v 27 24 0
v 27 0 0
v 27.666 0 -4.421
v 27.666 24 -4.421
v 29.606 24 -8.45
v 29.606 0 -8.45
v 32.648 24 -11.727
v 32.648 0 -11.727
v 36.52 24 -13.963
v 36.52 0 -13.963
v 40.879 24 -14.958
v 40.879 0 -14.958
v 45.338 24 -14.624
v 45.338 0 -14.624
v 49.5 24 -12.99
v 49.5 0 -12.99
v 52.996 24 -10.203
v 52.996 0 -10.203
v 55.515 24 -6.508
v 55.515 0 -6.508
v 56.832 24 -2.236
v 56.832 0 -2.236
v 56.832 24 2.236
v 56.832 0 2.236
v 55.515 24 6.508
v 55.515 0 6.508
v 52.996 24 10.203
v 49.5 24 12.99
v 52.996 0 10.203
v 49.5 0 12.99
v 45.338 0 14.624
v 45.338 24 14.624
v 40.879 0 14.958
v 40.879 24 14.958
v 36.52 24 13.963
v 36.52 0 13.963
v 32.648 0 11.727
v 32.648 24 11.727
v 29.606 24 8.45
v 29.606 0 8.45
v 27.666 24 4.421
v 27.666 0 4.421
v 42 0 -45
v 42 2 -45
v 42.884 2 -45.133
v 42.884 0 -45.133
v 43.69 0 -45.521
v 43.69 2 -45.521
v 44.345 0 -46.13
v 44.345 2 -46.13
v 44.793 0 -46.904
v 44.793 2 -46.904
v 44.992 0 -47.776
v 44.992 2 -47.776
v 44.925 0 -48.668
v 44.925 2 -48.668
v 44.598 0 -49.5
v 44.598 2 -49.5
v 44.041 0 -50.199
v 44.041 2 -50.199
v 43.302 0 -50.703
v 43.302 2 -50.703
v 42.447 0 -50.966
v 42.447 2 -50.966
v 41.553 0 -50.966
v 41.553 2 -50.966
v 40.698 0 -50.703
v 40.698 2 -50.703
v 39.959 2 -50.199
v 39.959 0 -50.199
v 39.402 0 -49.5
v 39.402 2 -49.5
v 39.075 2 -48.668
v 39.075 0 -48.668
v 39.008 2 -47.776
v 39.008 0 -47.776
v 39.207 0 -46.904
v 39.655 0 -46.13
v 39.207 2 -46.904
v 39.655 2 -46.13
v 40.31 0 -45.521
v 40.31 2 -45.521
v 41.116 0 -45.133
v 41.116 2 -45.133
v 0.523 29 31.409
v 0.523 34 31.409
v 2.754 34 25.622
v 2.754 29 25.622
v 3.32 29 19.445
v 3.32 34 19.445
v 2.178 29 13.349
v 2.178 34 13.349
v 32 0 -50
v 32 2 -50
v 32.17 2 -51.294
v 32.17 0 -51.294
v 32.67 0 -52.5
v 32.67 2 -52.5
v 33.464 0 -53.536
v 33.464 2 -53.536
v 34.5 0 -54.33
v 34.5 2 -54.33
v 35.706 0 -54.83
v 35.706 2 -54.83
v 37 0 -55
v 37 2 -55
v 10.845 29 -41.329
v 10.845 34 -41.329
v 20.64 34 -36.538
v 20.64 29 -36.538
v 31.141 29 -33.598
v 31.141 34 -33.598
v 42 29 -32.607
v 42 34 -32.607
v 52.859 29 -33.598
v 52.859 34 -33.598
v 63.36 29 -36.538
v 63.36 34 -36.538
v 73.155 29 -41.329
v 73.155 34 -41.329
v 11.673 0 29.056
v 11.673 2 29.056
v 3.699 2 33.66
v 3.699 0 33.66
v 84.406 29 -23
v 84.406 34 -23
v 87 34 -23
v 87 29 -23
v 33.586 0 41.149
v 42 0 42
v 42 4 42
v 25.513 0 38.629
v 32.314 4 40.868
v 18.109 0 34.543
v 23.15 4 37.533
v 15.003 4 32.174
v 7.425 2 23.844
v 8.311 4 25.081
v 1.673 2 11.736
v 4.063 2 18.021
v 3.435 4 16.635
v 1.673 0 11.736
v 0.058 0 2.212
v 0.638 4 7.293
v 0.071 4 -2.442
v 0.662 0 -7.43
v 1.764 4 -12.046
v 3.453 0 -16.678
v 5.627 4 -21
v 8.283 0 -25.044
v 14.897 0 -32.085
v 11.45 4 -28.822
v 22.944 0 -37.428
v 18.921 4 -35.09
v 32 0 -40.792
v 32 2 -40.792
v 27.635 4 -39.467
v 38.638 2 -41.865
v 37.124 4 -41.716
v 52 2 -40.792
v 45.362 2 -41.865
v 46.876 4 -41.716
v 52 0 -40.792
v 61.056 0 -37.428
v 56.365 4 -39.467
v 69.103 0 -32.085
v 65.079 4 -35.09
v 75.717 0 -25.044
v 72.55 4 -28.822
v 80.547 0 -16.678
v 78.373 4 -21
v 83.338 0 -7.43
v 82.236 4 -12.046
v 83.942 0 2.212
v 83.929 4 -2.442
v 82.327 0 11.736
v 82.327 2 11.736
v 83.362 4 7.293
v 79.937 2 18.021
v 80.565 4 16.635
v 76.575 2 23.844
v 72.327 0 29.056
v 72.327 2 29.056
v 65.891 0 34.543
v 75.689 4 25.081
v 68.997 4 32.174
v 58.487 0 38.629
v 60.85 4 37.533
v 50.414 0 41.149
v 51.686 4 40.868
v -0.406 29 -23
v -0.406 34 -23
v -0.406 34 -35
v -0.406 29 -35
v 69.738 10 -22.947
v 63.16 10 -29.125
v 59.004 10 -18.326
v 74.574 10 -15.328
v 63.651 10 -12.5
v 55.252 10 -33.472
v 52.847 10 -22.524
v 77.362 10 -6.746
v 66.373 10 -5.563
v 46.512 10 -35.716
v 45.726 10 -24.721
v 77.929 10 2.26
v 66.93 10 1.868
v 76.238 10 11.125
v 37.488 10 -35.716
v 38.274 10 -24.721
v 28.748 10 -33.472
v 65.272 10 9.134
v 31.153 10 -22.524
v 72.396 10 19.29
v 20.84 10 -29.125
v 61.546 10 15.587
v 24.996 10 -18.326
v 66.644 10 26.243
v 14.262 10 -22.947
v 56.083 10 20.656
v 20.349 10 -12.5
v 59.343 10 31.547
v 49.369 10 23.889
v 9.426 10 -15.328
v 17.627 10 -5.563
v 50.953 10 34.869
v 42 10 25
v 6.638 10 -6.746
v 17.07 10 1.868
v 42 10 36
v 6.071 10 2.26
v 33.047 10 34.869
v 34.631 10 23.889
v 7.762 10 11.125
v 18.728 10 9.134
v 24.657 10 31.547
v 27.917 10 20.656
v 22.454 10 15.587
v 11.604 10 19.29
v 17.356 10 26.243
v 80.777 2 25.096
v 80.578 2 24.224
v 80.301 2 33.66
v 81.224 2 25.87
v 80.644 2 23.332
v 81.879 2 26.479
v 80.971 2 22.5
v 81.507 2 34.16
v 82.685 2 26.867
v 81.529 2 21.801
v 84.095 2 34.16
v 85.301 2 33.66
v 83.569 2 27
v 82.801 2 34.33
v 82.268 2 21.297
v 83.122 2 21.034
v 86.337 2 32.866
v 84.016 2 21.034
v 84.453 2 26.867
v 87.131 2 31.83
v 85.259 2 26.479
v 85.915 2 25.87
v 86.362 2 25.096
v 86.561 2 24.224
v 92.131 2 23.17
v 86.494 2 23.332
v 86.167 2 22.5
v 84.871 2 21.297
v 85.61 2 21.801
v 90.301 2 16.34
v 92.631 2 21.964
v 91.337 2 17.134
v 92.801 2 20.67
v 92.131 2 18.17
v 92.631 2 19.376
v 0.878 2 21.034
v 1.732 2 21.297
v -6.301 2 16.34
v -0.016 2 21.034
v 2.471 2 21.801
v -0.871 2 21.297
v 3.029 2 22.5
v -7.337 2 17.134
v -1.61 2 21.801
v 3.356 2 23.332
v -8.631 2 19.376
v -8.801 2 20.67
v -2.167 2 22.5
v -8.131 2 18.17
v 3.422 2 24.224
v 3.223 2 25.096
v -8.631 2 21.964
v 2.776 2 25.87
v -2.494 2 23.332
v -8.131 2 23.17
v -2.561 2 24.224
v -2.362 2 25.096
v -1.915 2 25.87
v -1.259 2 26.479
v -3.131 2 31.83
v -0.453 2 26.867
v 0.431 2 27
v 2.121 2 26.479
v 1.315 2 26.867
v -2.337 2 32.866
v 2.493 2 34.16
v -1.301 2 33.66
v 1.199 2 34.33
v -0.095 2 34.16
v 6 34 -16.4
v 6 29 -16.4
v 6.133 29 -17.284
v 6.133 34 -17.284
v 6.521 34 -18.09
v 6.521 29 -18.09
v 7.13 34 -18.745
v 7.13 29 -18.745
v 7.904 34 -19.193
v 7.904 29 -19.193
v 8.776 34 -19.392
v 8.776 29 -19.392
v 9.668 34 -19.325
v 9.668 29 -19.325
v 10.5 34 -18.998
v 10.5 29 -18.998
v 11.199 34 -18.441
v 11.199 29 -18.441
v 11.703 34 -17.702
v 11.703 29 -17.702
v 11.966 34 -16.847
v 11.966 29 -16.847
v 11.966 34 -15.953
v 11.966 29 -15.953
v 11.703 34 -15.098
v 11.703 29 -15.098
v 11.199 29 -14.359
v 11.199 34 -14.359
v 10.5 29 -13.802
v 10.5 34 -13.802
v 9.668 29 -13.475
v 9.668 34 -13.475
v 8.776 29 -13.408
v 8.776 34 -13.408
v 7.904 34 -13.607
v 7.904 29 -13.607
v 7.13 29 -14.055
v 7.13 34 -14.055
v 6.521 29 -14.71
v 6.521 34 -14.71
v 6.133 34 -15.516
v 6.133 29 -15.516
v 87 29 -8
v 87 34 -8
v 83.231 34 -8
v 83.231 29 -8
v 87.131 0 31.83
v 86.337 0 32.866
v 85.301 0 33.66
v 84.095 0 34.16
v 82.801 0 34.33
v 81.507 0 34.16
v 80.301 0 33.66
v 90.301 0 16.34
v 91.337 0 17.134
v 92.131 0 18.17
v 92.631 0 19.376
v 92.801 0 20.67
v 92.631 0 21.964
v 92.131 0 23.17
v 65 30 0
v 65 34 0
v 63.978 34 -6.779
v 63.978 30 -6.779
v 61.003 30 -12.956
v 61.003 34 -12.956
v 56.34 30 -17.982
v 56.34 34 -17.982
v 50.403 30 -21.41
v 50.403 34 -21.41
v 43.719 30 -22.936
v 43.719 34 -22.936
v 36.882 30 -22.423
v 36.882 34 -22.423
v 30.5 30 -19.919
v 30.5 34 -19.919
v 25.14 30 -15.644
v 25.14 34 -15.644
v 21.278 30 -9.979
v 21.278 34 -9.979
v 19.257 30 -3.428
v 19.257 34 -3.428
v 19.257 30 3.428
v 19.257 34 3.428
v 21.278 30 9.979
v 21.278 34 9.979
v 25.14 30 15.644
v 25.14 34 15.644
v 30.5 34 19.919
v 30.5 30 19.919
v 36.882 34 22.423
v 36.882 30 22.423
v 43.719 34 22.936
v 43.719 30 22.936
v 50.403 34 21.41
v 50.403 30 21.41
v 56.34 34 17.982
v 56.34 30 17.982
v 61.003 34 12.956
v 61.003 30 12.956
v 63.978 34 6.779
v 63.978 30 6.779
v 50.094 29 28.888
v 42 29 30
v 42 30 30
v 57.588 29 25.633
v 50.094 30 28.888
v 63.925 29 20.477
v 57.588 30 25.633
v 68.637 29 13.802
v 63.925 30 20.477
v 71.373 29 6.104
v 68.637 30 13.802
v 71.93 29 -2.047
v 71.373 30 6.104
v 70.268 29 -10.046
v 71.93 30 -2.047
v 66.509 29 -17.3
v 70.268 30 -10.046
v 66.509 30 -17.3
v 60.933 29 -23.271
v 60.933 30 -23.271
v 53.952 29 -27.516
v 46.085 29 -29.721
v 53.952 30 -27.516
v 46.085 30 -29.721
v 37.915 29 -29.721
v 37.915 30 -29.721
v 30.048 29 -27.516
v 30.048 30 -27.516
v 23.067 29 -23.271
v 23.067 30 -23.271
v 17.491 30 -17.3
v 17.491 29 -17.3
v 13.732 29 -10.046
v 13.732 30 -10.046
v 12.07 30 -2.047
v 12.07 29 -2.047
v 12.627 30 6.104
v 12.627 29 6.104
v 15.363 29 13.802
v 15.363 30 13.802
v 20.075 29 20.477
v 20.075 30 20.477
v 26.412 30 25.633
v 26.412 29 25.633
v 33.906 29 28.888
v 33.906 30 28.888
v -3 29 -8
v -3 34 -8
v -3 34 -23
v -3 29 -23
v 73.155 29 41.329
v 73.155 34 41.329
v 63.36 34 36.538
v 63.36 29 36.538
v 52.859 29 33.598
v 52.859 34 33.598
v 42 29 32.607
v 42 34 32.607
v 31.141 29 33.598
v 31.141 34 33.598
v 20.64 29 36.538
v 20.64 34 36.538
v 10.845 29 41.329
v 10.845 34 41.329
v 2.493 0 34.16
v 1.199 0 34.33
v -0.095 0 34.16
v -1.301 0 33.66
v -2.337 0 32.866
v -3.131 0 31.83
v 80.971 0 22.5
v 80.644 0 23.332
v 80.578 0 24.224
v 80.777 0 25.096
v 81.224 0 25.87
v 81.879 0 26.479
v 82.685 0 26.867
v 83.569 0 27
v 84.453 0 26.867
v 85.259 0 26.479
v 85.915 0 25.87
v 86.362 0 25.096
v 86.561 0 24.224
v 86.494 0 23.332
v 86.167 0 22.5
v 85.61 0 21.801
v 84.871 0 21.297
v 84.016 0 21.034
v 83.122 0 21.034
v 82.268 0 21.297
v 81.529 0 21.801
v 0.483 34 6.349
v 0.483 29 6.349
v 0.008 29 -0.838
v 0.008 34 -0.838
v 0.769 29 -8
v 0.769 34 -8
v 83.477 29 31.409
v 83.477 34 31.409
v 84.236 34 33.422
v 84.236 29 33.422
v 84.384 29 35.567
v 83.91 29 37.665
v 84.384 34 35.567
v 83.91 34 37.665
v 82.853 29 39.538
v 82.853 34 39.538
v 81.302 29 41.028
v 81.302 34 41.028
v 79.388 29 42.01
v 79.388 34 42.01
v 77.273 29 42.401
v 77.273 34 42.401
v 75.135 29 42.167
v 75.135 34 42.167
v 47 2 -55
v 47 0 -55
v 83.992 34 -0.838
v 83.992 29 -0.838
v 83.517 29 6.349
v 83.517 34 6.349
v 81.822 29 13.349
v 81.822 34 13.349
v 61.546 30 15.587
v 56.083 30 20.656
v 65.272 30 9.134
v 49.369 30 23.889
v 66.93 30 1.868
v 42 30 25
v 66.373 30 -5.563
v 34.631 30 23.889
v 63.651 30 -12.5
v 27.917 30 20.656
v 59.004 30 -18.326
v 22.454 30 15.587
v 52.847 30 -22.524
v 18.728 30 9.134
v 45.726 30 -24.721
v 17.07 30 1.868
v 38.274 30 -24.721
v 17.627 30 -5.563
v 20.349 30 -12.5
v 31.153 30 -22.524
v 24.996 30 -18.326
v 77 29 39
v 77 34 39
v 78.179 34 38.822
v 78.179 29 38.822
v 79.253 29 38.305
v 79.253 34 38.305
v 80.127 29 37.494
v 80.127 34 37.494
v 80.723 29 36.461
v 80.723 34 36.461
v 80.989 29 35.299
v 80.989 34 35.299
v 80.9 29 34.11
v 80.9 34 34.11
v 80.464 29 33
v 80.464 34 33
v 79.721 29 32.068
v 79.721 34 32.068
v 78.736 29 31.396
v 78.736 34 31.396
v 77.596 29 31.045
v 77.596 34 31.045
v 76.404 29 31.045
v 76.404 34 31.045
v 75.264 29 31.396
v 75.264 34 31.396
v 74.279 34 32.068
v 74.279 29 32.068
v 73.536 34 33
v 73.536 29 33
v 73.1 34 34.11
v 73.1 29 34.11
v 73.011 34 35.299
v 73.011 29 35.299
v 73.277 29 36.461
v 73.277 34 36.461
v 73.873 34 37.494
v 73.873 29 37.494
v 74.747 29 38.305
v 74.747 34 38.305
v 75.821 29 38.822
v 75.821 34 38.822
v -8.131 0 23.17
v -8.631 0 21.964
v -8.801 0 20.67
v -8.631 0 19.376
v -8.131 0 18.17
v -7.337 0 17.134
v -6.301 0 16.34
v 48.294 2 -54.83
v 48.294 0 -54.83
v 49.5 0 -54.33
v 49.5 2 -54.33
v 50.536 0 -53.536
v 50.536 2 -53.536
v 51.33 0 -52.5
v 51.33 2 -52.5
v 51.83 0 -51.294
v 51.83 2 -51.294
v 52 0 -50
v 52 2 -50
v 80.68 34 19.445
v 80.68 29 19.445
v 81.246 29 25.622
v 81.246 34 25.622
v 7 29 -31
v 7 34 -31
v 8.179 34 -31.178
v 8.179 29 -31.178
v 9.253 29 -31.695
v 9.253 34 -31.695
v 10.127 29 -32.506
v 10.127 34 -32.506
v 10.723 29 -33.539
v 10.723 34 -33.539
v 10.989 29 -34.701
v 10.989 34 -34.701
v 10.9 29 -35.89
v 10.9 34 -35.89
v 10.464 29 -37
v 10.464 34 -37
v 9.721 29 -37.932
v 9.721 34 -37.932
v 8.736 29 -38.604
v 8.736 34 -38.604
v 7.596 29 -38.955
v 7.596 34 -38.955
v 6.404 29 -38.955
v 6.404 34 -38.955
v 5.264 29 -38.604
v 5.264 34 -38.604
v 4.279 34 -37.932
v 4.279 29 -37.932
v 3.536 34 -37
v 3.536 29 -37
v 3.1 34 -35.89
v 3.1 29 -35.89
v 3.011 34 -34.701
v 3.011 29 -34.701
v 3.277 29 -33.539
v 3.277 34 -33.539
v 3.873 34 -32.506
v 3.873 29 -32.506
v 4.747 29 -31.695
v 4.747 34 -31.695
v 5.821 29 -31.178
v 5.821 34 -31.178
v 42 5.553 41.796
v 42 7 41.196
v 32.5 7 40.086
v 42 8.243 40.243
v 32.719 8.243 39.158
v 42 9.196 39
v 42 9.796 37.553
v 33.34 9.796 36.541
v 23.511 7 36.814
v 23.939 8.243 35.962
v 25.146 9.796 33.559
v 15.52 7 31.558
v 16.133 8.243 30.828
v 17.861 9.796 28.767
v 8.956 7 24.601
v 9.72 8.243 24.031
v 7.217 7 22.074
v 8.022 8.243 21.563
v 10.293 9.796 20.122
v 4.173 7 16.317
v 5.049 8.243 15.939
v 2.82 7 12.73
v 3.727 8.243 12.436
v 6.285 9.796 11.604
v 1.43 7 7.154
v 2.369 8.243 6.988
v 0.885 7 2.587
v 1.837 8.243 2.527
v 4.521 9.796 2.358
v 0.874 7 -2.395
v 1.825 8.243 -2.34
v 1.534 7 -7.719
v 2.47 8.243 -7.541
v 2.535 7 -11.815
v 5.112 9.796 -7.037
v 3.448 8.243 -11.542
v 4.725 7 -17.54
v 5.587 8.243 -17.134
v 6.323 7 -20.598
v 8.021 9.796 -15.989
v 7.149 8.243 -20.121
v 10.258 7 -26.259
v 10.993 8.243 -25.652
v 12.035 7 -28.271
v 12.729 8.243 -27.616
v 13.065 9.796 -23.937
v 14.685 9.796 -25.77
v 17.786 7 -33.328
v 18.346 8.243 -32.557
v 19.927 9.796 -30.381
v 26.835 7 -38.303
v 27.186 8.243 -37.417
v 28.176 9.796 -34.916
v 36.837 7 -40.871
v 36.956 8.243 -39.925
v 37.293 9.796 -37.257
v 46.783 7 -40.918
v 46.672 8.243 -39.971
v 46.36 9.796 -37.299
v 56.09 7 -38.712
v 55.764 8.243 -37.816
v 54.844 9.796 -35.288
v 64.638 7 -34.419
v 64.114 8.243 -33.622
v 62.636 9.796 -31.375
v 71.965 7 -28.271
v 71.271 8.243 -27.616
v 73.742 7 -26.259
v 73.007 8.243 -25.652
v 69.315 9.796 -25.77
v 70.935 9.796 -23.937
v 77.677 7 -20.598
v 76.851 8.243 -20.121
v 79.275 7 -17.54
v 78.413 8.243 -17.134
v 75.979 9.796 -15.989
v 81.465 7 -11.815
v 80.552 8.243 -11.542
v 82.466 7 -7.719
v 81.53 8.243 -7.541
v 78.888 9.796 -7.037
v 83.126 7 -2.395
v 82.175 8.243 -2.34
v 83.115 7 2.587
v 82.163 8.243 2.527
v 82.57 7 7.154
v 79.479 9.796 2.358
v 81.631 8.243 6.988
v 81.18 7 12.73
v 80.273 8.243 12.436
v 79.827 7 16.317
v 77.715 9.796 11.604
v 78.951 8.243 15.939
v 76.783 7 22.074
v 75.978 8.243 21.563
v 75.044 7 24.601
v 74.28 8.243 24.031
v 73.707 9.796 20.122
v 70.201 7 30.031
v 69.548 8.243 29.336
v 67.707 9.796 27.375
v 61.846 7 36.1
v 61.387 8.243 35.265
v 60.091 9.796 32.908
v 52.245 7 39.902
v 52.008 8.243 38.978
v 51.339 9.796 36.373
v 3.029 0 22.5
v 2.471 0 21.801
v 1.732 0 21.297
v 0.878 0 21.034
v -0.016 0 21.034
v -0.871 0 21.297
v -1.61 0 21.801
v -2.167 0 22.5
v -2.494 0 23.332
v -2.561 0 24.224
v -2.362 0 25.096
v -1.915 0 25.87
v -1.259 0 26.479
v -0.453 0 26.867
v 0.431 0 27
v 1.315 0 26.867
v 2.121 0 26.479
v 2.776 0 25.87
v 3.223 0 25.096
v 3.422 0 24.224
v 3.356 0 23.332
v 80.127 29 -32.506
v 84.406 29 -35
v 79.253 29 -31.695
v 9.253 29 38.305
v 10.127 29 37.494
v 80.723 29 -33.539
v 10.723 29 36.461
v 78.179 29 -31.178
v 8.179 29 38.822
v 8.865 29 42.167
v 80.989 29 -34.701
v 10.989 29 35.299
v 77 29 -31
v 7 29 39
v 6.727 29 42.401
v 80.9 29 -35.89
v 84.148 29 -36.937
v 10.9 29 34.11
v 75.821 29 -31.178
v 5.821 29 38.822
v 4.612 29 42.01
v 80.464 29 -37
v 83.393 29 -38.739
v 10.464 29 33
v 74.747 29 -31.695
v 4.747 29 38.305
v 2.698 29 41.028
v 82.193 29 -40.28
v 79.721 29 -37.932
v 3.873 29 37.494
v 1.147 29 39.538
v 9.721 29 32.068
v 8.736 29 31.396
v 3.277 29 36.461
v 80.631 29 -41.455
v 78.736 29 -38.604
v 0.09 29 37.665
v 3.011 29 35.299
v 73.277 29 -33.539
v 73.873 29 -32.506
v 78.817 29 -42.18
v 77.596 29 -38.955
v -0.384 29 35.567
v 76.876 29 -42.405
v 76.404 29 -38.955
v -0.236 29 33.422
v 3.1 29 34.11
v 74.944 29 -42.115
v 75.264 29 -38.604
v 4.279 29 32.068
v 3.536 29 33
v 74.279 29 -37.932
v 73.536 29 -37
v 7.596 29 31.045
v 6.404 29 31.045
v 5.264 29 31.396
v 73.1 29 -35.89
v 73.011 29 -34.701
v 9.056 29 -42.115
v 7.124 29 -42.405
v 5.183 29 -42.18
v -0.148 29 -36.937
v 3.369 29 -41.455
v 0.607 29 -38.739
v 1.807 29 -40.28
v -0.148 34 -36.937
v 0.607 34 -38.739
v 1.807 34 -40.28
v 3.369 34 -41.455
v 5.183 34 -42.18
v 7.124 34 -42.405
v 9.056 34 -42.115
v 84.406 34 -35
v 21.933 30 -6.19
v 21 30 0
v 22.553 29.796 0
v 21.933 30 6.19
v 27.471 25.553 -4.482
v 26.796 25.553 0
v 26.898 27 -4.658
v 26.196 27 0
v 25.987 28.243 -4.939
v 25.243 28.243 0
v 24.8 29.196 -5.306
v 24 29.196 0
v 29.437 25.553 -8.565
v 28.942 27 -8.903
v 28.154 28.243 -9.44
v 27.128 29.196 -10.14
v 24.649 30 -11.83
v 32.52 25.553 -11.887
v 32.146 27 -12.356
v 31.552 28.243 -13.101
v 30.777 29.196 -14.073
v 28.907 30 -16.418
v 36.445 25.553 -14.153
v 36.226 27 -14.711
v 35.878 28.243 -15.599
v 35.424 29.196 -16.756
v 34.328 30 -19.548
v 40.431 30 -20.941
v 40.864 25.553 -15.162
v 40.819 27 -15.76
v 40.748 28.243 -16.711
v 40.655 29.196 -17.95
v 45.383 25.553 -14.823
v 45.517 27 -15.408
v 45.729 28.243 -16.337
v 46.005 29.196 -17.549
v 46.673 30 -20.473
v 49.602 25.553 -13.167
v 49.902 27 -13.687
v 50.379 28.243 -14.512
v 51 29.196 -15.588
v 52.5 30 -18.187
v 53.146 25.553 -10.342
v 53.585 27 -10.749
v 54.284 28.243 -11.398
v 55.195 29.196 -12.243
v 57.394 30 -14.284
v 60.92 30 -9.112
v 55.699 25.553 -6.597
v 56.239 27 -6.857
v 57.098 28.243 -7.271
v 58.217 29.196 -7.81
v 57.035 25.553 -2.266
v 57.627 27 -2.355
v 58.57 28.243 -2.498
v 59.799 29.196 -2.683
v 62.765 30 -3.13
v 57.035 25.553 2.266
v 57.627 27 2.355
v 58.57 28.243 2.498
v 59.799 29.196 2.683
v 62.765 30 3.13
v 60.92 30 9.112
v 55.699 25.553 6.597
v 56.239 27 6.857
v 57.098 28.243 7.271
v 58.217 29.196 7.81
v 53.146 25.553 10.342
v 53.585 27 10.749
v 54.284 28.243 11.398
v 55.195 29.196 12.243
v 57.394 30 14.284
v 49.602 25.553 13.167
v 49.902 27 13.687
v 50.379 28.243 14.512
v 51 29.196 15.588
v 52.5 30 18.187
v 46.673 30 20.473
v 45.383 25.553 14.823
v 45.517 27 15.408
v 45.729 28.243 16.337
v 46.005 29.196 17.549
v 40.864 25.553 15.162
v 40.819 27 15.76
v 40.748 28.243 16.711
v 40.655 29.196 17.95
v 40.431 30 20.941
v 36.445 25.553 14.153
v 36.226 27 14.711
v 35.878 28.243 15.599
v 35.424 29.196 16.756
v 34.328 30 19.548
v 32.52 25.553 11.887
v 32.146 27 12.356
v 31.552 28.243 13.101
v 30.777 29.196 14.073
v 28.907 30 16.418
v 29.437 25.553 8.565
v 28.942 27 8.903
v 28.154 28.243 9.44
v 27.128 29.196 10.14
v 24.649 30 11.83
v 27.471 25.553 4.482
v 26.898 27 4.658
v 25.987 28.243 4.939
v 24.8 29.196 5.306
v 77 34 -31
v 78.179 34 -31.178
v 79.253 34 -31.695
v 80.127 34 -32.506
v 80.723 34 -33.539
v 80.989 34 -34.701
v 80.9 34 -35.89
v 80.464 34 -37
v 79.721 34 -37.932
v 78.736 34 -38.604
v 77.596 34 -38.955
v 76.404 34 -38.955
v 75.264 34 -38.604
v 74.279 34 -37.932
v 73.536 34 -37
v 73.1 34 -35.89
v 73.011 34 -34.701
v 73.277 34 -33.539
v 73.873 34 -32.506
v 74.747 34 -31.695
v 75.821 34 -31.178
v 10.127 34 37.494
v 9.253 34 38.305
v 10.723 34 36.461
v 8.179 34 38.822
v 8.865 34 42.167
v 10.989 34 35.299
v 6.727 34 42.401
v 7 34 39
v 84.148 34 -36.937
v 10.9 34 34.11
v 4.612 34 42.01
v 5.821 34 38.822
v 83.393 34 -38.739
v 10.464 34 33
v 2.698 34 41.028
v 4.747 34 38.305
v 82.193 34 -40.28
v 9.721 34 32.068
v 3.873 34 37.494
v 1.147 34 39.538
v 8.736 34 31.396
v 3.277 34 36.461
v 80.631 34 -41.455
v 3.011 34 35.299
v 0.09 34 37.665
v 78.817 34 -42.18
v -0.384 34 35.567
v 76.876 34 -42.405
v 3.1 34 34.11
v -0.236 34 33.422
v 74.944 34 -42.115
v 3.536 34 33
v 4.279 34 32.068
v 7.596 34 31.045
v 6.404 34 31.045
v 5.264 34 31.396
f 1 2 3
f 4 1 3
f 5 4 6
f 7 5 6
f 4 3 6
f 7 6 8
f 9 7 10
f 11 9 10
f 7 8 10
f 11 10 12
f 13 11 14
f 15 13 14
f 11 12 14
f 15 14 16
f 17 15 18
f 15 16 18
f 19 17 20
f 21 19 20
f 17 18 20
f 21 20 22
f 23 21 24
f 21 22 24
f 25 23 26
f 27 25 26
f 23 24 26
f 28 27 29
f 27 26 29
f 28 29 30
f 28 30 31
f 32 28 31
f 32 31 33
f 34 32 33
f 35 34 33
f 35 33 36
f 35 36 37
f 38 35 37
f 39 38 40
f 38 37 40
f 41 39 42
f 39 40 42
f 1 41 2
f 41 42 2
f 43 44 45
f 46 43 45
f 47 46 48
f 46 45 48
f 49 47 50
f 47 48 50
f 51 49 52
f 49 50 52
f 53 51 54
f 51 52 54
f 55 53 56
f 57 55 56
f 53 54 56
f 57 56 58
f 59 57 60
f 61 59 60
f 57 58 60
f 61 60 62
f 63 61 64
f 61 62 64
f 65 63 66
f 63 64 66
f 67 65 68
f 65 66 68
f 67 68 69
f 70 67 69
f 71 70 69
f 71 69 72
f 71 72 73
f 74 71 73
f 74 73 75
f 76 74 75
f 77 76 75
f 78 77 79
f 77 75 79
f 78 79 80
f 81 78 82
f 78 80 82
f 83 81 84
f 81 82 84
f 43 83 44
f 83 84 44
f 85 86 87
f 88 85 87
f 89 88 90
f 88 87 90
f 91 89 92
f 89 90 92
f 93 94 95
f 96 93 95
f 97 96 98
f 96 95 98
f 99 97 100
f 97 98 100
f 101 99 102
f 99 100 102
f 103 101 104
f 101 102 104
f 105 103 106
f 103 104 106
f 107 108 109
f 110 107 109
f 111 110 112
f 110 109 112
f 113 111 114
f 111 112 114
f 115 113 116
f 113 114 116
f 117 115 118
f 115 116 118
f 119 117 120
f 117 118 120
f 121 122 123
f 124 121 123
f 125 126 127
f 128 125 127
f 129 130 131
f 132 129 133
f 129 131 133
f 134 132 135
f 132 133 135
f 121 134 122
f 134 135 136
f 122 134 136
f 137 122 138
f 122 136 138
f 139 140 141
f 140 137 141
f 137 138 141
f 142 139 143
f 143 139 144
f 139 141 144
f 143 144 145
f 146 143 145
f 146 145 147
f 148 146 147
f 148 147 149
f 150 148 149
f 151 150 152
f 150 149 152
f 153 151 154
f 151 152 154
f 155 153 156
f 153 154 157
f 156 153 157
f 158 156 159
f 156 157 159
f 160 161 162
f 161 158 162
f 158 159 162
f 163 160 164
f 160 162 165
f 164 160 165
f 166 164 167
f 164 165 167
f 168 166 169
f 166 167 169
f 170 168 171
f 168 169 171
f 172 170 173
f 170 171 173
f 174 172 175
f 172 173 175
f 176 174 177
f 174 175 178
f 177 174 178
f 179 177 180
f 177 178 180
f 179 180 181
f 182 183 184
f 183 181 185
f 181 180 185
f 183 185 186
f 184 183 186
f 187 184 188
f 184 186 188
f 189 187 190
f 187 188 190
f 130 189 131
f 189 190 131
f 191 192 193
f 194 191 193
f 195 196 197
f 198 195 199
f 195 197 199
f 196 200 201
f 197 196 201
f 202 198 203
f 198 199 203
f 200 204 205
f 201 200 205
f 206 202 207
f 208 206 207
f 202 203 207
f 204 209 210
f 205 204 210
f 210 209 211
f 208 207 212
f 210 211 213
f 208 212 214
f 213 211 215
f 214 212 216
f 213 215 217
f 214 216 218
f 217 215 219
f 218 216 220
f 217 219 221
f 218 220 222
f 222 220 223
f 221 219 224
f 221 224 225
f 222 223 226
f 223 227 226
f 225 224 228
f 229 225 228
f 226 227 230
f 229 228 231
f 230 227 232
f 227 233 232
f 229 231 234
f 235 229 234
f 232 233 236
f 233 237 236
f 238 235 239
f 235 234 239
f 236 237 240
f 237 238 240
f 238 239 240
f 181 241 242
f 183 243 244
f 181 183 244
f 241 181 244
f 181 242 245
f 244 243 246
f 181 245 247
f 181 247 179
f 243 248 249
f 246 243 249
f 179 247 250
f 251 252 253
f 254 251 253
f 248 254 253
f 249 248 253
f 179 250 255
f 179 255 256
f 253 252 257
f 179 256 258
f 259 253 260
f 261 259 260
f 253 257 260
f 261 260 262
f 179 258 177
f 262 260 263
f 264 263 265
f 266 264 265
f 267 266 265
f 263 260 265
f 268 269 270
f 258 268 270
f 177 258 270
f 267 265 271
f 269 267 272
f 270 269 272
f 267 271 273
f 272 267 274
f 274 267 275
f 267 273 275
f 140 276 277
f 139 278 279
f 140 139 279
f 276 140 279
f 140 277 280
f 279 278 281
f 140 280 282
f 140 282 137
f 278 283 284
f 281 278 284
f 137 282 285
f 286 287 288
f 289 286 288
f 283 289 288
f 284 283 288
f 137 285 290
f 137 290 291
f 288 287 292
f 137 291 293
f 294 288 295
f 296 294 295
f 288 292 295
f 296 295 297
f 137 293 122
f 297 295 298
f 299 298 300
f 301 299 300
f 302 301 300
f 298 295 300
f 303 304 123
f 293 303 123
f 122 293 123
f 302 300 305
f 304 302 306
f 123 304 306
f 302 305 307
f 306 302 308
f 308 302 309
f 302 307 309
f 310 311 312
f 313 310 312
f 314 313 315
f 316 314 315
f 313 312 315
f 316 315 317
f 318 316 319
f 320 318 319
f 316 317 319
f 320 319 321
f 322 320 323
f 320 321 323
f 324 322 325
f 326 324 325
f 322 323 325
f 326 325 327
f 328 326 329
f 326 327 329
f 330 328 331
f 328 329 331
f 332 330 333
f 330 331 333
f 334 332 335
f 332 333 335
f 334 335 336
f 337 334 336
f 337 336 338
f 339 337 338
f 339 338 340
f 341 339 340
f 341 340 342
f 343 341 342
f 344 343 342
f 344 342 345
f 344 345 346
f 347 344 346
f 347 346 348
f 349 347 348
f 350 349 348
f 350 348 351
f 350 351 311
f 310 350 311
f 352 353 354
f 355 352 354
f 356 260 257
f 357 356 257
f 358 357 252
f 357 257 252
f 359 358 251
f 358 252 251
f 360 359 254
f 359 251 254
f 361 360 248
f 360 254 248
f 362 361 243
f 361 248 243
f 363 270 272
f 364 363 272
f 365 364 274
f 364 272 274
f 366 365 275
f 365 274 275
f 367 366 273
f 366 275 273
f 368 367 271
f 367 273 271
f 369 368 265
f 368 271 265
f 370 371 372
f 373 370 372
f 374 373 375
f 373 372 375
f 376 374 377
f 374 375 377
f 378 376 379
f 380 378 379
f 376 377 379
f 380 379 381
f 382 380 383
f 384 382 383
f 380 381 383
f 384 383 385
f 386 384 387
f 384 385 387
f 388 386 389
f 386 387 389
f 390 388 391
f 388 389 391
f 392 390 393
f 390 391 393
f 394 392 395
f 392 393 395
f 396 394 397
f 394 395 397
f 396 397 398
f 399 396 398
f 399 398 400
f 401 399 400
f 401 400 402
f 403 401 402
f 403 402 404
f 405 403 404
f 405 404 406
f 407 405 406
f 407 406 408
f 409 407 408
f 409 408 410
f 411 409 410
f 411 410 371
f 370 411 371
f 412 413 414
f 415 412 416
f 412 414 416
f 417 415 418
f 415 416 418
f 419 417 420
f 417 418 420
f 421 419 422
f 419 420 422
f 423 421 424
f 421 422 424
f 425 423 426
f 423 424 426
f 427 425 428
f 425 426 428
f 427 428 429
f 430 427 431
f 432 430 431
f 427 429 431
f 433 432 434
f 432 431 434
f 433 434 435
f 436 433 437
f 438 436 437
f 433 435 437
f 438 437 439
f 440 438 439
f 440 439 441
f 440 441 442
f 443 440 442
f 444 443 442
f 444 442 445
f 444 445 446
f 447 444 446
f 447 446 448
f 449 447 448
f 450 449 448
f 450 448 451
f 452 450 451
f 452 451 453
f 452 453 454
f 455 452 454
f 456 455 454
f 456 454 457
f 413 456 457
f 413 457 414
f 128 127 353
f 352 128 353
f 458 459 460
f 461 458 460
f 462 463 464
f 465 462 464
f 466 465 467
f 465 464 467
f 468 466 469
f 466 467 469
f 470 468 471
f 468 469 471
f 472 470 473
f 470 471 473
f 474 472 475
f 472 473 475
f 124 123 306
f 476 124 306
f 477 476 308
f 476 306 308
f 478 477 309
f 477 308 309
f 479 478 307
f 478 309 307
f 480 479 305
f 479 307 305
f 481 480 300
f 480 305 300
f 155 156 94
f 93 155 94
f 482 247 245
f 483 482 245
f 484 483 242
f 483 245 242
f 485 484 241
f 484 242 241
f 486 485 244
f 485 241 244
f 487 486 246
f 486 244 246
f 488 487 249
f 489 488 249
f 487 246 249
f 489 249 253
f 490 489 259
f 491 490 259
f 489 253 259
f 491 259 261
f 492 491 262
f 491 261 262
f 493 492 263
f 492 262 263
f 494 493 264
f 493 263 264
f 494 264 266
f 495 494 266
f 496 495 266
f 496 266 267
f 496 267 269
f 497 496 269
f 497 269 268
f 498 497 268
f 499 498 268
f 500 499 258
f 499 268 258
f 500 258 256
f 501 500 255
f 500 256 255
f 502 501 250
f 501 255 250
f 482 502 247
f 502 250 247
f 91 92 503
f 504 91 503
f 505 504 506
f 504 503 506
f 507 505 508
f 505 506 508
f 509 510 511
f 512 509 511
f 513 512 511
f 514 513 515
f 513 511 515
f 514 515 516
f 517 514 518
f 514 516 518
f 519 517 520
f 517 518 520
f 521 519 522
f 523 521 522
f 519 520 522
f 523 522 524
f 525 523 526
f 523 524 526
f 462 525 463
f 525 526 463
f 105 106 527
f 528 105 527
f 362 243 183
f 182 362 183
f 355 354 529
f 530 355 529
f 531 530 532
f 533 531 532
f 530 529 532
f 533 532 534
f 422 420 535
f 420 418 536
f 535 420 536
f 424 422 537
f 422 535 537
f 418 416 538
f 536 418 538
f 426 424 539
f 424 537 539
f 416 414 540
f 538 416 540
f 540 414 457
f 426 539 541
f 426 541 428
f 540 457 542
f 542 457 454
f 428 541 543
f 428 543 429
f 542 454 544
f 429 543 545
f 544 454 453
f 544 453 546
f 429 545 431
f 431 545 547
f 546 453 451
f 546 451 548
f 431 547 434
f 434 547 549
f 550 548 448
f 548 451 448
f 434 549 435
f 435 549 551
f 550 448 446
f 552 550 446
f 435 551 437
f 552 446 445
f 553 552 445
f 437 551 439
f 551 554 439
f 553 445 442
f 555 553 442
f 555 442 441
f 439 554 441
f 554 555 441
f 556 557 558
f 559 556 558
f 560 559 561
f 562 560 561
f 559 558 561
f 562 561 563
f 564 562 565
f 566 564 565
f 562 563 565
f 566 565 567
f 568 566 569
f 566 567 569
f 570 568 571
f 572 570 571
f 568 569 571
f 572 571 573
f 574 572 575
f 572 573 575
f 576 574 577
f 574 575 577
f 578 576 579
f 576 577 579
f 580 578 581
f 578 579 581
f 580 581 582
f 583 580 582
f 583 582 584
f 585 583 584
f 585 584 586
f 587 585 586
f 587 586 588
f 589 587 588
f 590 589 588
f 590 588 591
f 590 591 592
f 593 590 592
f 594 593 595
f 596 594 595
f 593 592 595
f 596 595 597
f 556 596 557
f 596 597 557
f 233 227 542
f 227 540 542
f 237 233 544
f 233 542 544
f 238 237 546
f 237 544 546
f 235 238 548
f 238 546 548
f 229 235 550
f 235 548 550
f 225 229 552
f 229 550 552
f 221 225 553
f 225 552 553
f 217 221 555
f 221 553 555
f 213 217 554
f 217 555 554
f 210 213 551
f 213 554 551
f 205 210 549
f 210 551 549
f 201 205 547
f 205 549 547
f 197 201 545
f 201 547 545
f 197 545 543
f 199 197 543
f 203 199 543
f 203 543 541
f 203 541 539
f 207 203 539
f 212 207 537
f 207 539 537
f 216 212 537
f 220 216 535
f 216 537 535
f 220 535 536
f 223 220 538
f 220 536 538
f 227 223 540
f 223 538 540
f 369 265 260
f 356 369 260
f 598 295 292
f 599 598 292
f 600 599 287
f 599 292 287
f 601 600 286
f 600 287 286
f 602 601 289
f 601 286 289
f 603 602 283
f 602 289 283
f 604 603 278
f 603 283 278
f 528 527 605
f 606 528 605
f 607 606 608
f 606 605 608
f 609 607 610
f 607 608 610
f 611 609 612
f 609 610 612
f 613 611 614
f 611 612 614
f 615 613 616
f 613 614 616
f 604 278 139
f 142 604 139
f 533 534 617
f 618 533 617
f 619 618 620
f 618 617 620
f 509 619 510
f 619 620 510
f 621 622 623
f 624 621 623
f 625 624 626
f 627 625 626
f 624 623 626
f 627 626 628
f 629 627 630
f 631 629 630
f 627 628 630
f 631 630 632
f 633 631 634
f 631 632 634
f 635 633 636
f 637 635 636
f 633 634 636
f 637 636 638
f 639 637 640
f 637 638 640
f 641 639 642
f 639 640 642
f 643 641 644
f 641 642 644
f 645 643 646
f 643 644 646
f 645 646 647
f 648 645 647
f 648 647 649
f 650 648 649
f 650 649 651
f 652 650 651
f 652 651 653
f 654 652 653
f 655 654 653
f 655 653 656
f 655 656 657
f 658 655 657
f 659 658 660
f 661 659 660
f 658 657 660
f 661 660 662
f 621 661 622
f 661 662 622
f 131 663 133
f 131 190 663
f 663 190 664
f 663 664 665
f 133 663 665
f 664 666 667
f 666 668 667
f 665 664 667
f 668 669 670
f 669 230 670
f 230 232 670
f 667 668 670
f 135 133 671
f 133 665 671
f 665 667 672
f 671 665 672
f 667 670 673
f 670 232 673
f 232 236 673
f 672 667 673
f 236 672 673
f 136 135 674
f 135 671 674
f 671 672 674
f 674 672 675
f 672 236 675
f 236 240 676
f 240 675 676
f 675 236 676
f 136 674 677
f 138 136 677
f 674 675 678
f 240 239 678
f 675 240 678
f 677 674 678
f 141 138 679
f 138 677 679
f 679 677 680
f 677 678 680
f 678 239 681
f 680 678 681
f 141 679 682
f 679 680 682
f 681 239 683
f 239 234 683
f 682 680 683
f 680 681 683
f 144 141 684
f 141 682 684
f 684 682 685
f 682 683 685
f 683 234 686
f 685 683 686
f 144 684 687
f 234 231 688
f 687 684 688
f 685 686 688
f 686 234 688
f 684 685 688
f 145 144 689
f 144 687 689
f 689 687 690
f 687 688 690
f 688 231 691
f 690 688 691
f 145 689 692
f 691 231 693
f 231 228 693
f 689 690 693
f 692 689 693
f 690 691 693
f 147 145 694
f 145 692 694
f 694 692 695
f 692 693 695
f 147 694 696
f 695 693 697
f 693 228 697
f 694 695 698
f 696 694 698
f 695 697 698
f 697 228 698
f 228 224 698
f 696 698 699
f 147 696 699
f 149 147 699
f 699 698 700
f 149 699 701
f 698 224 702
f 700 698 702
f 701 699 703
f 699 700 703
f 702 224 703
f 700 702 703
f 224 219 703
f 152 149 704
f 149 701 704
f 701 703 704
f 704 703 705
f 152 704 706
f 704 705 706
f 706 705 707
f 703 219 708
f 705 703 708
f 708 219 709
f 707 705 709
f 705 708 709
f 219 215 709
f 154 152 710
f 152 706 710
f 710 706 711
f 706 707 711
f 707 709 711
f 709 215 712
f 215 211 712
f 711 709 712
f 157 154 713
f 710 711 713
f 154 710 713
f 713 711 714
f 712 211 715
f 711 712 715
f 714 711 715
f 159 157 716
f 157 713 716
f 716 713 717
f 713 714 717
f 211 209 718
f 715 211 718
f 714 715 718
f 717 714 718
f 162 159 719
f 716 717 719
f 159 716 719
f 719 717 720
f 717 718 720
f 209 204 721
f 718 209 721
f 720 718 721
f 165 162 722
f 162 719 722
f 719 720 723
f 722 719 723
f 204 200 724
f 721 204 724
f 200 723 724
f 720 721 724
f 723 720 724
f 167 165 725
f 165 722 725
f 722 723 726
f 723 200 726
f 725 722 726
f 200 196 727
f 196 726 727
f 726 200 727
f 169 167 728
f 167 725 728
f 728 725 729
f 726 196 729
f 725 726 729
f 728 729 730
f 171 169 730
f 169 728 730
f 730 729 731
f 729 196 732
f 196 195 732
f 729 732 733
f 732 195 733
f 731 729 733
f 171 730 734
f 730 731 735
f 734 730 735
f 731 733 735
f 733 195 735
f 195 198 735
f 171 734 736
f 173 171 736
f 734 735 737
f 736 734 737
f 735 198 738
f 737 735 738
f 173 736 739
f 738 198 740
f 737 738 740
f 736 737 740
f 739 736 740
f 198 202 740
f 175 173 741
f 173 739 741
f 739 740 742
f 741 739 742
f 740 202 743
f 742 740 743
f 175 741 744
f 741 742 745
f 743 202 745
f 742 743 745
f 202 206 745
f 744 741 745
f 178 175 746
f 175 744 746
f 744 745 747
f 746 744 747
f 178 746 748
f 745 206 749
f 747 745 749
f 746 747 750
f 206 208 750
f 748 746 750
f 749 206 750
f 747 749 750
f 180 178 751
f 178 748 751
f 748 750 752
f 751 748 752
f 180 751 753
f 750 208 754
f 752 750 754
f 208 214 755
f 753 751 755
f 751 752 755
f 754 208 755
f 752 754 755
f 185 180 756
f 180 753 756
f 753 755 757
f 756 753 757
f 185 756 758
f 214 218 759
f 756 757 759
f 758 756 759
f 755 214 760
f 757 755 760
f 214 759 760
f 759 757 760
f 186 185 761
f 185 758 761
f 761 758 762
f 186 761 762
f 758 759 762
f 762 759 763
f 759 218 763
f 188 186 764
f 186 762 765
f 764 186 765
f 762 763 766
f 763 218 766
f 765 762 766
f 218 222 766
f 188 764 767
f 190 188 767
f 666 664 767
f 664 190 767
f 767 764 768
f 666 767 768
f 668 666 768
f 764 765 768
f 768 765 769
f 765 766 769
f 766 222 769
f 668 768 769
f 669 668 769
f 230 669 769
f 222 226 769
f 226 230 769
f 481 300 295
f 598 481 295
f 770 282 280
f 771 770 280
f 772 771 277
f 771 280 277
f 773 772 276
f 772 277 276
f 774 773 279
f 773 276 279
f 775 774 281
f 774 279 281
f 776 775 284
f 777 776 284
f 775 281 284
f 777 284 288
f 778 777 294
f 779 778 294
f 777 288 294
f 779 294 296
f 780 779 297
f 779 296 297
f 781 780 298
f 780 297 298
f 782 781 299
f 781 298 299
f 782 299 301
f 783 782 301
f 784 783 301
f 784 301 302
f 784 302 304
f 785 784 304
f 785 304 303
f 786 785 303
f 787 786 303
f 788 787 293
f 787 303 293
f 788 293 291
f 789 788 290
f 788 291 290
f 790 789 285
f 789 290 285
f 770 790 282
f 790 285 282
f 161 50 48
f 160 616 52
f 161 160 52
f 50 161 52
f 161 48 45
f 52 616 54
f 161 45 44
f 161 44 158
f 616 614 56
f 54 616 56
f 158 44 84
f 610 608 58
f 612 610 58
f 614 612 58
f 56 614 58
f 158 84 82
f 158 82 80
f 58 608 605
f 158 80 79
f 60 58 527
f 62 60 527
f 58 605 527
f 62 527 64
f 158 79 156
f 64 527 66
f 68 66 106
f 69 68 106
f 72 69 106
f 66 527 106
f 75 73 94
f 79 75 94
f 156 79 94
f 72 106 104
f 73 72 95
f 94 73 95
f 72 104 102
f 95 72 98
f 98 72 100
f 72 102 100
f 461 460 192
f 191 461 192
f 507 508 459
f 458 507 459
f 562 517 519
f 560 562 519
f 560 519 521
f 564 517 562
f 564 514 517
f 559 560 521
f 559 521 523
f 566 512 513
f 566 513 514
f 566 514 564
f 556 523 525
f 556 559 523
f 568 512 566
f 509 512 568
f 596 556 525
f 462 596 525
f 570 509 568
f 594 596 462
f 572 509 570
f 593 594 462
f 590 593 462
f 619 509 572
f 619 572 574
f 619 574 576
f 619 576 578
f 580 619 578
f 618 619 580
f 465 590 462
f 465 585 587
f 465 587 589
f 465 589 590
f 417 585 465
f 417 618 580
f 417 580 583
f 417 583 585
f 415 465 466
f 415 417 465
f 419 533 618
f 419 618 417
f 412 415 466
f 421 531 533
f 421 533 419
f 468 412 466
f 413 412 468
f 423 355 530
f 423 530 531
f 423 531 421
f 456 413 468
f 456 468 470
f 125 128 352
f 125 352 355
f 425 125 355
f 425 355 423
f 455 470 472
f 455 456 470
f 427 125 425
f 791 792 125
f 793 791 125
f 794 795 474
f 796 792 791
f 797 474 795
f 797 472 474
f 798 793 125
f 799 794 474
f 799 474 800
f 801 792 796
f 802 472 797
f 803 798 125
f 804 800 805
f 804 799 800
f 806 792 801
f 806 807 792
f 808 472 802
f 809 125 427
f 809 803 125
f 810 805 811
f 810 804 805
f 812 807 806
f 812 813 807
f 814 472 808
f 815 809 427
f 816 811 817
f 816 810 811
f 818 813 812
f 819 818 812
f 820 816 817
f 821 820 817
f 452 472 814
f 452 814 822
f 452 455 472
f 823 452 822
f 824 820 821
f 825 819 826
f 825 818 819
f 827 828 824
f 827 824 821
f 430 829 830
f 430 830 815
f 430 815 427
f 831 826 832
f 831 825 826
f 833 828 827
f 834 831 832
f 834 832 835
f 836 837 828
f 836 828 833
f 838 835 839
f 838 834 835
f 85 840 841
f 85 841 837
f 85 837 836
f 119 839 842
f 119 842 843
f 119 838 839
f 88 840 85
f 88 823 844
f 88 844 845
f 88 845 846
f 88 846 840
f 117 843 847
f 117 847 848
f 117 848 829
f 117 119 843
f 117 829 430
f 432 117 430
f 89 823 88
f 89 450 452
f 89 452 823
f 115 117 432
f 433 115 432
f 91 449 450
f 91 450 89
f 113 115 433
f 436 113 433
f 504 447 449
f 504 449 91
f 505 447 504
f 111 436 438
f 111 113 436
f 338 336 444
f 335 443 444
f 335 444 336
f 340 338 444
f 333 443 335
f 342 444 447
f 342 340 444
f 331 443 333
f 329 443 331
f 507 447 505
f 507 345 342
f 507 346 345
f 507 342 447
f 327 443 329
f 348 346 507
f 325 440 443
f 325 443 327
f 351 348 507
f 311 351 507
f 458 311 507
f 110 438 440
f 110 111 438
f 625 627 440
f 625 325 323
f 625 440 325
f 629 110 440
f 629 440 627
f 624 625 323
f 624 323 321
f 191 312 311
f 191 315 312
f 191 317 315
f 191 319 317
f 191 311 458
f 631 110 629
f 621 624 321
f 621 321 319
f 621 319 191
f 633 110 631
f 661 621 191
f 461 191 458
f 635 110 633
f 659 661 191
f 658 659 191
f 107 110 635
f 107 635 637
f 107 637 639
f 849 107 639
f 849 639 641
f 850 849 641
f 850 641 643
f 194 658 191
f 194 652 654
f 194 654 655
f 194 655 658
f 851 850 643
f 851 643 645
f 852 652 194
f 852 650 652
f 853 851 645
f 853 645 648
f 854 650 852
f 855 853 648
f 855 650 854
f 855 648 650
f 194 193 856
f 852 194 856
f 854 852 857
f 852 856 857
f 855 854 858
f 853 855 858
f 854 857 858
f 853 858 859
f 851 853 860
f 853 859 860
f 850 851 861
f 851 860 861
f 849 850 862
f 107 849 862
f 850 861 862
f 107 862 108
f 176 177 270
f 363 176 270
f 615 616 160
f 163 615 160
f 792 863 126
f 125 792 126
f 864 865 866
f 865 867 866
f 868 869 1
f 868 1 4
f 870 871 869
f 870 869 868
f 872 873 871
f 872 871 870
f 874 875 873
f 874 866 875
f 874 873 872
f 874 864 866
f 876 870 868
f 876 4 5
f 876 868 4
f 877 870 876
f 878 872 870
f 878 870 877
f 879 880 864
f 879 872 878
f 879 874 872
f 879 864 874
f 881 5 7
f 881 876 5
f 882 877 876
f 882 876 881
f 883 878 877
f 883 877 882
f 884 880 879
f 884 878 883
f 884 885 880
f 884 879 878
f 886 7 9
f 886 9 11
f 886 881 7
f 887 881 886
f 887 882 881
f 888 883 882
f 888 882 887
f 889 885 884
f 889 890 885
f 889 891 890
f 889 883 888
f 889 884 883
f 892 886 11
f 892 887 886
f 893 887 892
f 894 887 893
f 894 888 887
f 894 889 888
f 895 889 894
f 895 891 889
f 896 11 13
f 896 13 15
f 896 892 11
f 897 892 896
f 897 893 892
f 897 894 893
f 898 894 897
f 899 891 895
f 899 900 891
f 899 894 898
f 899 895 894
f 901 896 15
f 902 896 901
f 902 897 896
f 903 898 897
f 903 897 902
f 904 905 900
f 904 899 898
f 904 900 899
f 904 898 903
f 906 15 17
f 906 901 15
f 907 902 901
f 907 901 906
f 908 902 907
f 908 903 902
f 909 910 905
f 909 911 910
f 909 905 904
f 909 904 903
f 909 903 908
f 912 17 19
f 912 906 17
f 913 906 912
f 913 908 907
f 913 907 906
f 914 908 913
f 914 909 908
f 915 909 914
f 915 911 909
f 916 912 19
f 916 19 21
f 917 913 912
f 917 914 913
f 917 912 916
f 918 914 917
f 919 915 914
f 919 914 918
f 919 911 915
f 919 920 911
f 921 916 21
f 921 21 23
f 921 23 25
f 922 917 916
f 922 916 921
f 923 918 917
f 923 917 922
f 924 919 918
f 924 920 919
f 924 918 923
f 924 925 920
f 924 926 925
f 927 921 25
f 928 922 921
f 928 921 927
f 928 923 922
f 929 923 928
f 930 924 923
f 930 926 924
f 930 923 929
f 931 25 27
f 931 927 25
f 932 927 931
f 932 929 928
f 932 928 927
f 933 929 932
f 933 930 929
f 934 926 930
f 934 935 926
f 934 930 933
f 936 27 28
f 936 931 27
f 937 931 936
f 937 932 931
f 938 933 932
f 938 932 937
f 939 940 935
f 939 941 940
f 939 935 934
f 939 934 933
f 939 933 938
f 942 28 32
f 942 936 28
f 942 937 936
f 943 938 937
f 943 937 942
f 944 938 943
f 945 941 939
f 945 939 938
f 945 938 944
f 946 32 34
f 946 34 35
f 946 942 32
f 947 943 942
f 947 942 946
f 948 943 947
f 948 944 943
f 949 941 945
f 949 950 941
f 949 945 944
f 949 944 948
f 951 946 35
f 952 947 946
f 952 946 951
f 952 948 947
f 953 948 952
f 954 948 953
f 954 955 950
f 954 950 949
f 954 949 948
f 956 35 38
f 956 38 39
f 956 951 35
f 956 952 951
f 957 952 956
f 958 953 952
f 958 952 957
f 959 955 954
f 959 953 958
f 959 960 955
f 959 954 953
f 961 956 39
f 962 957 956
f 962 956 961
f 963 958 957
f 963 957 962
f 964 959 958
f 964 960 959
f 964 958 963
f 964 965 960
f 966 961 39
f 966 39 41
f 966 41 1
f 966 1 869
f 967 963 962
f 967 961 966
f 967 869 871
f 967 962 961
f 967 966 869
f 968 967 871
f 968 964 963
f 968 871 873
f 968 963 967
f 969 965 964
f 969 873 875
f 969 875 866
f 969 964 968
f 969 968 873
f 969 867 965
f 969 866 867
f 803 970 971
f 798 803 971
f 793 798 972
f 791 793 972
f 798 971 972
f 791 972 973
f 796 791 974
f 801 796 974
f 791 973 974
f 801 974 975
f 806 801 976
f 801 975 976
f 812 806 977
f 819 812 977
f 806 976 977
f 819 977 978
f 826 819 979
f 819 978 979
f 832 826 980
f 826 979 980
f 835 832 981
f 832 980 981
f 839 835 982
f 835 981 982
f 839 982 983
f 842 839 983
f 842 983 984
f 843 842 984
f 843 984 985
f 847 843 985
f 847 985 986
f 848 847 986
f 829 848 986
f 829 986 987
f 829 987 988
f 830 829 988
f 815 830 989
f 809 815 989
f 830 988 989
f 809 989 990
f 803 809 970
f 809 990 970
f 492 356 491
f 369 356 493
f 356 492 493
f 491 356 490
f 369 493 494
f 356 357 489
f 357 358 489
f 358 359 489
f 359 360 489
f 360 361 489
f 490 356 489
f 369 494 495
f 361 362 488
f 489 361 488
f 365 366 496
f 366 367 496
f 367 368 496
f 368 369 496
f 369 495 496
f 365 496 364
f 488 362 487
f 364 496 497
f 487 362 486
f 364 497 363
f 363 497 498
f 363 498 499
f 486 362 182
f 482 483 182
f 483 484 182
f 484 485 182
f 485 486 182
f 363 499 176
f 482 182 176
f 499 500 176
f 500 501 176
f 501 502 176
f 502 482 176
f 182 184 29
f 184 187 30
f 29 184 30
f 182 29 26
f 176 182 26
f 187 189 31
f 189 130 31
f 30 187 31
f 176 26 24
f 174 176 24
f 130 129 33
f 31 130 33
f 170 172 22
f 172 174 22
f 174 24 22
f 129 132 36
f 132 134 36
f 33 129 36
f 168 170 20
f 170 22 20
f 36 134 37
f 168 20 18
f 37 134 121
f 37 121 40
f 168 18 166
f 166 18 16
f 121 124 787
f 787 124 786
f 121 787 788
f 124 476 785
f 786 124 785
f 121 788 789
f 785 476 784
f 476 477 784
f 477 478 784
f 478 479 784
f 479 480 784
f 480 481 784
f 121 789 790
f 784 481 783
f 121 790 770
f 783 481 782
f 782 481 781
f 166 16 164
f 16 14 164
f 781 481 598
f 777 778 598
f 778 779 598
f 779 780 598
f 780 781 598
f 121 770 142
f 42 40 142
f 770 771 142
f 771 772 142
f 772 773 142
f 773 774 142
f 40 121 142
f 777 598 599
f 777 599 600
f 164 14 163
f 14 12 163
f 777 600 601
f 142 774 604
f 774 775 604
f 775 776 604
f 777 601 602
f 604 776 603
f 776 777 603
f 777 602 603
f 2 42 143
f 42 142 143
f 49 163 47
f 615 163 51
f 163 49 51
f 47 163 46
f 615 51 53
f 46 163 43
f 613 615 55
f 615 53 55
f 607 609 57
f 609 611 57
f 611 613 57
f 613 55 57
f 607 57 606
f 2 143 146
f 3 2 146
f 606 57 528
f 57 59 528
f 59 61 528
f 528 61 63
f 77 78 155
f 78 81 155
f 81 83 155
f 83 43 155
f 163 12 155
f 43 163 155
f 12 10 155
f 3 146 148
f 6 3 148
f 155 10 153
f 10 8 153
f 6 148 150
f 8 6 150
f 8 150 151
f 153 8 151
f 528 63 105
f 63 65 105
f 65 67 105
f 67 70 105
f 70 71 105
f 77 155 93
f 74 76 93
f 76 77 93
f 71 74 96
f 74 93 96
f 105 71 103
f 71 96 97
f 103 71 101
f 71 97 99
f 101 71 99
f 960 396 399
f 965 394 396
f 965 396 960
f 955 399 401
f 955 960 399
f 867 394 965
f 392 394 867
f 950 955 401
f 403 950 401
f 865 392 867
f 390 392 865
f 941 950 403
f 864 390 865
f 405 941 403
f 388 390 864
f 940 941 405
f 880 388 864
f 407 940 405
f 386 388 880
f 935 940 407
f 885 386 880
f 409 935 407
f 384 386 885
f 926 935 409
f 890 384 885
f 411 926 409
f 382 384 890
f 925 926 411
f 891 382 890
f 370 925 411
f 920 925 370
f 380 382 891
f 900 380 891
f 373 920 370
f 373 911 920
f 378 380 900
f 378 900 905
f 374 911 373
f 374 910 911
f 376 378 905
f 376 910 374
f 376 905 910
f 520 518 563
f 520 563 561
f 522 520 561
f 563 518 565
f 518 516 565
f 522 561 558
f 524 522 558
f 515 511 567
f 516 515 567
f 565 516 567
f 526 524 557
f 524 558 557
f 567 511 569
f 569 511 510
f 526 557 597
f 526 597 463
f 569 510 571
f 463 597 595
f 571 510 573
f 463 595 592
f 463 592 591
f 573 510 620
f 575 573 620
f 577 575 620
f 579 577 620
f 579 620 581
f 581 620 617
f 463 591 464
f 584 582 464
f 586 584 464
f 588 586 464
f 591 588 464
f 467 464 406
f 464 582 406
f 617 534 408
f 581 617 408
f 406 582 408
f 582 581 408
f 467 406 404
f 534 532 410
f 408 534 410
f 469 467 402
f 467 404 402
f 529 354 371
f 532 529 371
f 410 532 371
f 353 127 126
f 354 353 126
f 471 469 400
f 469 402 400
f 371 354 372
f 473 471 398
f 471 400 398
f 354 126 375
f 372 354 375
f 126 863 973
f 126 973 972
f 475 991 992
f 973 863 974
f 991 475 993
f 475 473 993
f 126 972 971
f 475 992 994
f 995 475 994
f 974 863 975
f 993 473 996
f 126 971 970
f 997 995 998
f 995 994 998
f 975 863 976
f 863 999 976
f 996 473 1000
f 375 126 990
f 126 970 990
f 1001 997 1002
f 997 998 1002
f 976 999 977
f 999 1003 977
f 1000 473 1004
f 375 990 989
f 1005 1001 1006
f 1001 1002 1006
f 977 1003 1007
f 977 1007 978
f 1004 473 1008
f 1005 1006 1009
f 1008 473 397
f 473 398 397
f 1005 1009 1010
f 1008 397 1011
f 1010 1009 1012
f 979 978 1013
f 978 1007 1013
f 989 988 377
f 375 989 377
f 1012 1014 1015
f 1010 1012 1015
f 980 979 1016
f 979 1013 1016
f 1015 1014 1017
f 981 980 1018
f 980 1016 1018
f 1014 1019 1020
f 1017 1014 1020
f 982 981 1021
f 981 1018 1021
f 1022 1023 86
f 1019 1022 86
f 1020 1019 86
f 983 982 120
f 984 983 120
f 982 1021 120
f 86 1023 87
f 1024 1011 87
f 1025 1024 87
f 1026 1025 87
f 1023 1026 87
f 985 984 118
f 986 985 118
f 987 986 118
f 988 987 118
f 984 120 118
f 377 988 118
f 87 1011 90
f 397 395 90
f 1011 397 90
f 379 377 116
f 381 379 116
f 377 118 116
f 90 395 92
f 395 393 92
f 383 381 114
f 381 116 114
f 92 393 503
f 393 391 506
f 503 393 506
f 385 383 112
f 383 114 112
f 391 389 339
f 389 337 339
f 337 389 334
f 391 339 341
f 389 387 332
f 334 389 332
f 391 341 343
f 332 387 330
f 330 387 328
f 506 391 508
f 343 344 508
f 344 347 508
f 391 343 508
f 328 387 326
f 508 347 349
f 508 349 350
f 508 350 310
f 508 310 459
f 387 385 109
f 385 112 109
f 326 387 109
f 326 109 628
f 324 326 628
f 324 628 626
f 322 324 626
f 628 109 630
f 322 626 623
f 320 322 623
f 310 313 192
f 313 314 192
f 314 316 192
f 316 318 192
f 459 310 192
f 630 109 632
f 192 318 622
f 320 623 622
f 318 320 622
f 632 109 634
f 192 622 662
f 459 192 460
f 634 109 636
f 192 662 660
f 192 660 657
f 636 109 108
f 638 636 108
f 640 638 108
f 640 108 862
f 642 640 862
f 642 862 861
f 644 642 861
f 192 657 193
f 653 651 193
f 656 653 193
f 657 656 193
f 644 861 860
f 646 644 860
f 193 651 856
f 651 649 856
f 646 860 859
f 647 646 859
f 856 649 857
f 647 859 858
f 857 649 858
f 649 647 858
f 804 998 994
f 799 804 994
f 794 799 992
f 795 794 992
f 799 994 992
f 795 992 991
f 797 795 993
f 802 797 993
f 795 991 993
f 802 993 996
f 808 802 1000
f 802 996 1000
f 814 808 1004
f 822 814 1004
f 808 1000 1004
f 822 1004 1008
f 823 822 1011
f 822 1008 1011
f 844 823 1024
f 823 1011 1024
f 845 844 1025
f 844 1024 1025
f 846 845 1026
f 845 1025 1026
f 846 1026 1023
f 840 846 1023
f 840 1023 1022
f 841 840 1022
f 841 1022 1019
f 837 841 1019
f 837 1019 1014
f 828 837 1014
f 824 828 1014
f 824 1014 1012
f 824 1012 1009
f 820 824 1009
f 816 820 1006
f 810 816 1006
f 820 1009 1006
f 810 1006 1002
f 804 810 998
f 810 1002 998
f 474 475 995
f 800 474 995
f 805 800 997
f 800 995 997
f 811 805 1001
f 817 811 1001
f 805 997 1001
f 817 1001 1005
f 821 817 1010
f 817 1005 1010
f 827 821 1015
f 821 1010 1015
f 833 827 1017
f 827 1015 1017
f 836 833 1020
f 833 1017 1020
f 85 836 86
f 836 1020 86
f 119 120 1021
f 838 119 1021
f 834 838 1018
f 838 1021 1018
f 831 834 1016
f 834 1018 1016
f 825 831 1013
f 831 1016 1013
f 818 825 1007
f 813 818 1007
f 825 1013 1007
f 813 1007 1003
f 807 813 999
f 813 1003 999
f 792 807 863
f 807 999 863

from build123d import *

# Parameters (mm, degrees)
BOSS_EXTRUDE1_START = 2
SKETCH2_R           = 3
BOSS_EXTRUDE1_DEPTH = 2
CIRPATTERN1_COUNT   = 3
HOLE3_D             = 30
HOLE3_CBORE_D       = 46
HOLE3_CBORE_DEPTH   = 4
FILLET1_R           = 6
SKETCH9_R           = 30
SKETCH9_R_2         = 4
BOSS_EXTRUDE2_DEPTH = 5
HOLE4_D             = 6
HOLE4_DEPTH         = 5


with BuildPart() as part:
    # Sketch1 → Revolve1 (revolve)
    with BuildSketch(Plane.XY, mode=Mode.PRIVATE) as revolve1_sk:
        Polygon((0, 0), (0, 10), (17, 10), (17, 30), (12, 30), (12, 34), (42, 34), (42, 0), align=None)
    revolve(revolve1_sk.sketch.rotate(Axis((42, 34, 0), (0, -1, 0)), 270), axis=Axis((42, 34, 0), (0, -1, 0)))

    # Sketch2 → Boss-Extrude1 (add)
    with BuildSketch(Plane(origin=(0, 0, 0), x_dir=(1, 0, 0), z_dir=(0, 1, 0)).offset(BOSS_EXTRUDE1_START)):
        with BuildLine():
            Line((37, 55), (47, 55))
            ThreePointArc((47, 55), (50.535533906, 53.535533906), (52, 50))
            Line((52, 50), (52, 40.792156109))
            ThreePointArc((52, 40.792156109), (42, 42), (32, 40.792156109))
            Line((32, 40.792156109), (32, 50))
            ThreePointArc((32, 50), (33.464466094, 53.535533906), (37, 55))
        make_face()
        with Locations(Location((42, 48, 0), (0, 0, 270))):
            Circle(SKETCH2_R, mode=Mode.SUBTRACT)
    boss_extrude1 = extrude(amount=-BOSS_EXTRUDE1_DEPTH)

    # CirPattern1: Boss-Extrude1 ×3 about axis
    cirpattern1_axis = Axis((42, 0, 0), (0, 1, 0))
    for i in range(1, CIRPATTERN1_COUNT):
        add(boss_extrude1.rotate(cirpattern1_axis, i * 360 / CIRPATTERN1_COUNT))

    # Hole3 (through all)
    with Locations(Plane(origin=(0, 34, 0), x_dir=(1, 0, 0), z_dir=(0, 1, 0))):
        with Locations((42, 0)):
            CounterBoreHole(HOLE3_D / 2, HOLE3_CBORE_D / 2, HOLE3_CBORE_DEPTH)

    # Fillet1
    fillet1_edges = [part.edges().sort_by_distance(p)[0] for p in [
        (57, 30, 0),
        (42, 10, -42),
    ]]
    fillet(fillet1_edges, radius=FILLET1_R)

    # Sketch9 → Boss-Extrude2 (add)
    with BuildSketch(Plane(origin=(0, 34, 0), x_dir=(1, 0, 0), z_dir=(0, 1, 0))):
        with BuildLine():
            Line((84.405889748, 35), (84.405889748, 23))
            Line((84.405889748, 23), (87, 23))
            Line((87, 23), (87, 8))
            Line((87, 8), (83.231056256, 8))
            ThreePointArc((83.231056256, 8), (83.908844823, -2.76563295), (81.822211706, -13.348837209))
            ThreePointArc((81.822211706, -13.348837209), (80.749412141, -22.553158791), (83.47715359, -31.409222322))
            ThreePointArc((83.47715359, -31.409222322), (82.131599646, -40.339839701), (73.15454759, -41.329273159))
            ThreePointArc((73.15454759, -41.329273159), (42, -32.606891712), (10.84545241, -41.329273159))
            ThreePointArc((10.84545241, -41.329273159), (1.868400354, -40.339839701), (0.52284641, -31.409222322))
            ThreePointArc((0.52284641, -31.409222322), (3.250587859, -22.553158791), (2.177788294, -13.348837209))
            ThreePointArc((2.177788294, -13.348837209), (0.091155177, -2.76563295), (0.768943744, 8))
            Line((0.768943744, 8), (-3, 8))
            Line((-3, 8), (-3, 23))
            Line((-3, 23), (-0.405889748, 23))
            Line((-0.405889748, 23), (-0.405889748, 35))
            ThreePointArc((-0.405889748, 35), (3.369007961, 41.454695947), (10.84545241, 41.329273159))
            ThreePointArc((10.84545241, 41.329273159), (42, 32.606891712), (73.15454759, 41.329273159))
            ThreePointArc((73.15454759, 41.329273159), (80.630992039, 41.454695947), (84.405889748, 35))
        make_face()
        with Locations(Location((42, 0, 0), (0, 0, 270))):
            Circle(SKETCH9_R, mode=Mode.SUBTRACT)
        with Locations(Location((77, 35, 0), (0, 0, 270))):
            Circle(SKETCH9_R_2, mode=Mode.SUBTRACT)
        with Locations(Location((77, -35, 0), (0, 0, 270))):
            Circle(SKETCH9_R_2, mode=Mode.SUBTRACT)
        with Locations(Location((7, -35, 0), (0, 0, 270))):
            Circle(SKETCH9_R_2, mode=Mode.SUBTRACT)
        with Locations(Location((7, 35, 0), (0, 0, 270))):
            Circle(SKETCH9_R_2, mode=Mode.SUBTRACT)
    extrude(amount=-BOSS_EXTRUDE2_DEPTH)

    # Hole4
    with Locations(Plane(origin=(0, 34, 0), x_dir=(1, 0, 0), z_dir=(0, 1, 0))):
        with Locations((9, 16.4)):
            Hole(HOLE4_D / 2, depth=HOLE4_DEPTH)


solid = part.part
